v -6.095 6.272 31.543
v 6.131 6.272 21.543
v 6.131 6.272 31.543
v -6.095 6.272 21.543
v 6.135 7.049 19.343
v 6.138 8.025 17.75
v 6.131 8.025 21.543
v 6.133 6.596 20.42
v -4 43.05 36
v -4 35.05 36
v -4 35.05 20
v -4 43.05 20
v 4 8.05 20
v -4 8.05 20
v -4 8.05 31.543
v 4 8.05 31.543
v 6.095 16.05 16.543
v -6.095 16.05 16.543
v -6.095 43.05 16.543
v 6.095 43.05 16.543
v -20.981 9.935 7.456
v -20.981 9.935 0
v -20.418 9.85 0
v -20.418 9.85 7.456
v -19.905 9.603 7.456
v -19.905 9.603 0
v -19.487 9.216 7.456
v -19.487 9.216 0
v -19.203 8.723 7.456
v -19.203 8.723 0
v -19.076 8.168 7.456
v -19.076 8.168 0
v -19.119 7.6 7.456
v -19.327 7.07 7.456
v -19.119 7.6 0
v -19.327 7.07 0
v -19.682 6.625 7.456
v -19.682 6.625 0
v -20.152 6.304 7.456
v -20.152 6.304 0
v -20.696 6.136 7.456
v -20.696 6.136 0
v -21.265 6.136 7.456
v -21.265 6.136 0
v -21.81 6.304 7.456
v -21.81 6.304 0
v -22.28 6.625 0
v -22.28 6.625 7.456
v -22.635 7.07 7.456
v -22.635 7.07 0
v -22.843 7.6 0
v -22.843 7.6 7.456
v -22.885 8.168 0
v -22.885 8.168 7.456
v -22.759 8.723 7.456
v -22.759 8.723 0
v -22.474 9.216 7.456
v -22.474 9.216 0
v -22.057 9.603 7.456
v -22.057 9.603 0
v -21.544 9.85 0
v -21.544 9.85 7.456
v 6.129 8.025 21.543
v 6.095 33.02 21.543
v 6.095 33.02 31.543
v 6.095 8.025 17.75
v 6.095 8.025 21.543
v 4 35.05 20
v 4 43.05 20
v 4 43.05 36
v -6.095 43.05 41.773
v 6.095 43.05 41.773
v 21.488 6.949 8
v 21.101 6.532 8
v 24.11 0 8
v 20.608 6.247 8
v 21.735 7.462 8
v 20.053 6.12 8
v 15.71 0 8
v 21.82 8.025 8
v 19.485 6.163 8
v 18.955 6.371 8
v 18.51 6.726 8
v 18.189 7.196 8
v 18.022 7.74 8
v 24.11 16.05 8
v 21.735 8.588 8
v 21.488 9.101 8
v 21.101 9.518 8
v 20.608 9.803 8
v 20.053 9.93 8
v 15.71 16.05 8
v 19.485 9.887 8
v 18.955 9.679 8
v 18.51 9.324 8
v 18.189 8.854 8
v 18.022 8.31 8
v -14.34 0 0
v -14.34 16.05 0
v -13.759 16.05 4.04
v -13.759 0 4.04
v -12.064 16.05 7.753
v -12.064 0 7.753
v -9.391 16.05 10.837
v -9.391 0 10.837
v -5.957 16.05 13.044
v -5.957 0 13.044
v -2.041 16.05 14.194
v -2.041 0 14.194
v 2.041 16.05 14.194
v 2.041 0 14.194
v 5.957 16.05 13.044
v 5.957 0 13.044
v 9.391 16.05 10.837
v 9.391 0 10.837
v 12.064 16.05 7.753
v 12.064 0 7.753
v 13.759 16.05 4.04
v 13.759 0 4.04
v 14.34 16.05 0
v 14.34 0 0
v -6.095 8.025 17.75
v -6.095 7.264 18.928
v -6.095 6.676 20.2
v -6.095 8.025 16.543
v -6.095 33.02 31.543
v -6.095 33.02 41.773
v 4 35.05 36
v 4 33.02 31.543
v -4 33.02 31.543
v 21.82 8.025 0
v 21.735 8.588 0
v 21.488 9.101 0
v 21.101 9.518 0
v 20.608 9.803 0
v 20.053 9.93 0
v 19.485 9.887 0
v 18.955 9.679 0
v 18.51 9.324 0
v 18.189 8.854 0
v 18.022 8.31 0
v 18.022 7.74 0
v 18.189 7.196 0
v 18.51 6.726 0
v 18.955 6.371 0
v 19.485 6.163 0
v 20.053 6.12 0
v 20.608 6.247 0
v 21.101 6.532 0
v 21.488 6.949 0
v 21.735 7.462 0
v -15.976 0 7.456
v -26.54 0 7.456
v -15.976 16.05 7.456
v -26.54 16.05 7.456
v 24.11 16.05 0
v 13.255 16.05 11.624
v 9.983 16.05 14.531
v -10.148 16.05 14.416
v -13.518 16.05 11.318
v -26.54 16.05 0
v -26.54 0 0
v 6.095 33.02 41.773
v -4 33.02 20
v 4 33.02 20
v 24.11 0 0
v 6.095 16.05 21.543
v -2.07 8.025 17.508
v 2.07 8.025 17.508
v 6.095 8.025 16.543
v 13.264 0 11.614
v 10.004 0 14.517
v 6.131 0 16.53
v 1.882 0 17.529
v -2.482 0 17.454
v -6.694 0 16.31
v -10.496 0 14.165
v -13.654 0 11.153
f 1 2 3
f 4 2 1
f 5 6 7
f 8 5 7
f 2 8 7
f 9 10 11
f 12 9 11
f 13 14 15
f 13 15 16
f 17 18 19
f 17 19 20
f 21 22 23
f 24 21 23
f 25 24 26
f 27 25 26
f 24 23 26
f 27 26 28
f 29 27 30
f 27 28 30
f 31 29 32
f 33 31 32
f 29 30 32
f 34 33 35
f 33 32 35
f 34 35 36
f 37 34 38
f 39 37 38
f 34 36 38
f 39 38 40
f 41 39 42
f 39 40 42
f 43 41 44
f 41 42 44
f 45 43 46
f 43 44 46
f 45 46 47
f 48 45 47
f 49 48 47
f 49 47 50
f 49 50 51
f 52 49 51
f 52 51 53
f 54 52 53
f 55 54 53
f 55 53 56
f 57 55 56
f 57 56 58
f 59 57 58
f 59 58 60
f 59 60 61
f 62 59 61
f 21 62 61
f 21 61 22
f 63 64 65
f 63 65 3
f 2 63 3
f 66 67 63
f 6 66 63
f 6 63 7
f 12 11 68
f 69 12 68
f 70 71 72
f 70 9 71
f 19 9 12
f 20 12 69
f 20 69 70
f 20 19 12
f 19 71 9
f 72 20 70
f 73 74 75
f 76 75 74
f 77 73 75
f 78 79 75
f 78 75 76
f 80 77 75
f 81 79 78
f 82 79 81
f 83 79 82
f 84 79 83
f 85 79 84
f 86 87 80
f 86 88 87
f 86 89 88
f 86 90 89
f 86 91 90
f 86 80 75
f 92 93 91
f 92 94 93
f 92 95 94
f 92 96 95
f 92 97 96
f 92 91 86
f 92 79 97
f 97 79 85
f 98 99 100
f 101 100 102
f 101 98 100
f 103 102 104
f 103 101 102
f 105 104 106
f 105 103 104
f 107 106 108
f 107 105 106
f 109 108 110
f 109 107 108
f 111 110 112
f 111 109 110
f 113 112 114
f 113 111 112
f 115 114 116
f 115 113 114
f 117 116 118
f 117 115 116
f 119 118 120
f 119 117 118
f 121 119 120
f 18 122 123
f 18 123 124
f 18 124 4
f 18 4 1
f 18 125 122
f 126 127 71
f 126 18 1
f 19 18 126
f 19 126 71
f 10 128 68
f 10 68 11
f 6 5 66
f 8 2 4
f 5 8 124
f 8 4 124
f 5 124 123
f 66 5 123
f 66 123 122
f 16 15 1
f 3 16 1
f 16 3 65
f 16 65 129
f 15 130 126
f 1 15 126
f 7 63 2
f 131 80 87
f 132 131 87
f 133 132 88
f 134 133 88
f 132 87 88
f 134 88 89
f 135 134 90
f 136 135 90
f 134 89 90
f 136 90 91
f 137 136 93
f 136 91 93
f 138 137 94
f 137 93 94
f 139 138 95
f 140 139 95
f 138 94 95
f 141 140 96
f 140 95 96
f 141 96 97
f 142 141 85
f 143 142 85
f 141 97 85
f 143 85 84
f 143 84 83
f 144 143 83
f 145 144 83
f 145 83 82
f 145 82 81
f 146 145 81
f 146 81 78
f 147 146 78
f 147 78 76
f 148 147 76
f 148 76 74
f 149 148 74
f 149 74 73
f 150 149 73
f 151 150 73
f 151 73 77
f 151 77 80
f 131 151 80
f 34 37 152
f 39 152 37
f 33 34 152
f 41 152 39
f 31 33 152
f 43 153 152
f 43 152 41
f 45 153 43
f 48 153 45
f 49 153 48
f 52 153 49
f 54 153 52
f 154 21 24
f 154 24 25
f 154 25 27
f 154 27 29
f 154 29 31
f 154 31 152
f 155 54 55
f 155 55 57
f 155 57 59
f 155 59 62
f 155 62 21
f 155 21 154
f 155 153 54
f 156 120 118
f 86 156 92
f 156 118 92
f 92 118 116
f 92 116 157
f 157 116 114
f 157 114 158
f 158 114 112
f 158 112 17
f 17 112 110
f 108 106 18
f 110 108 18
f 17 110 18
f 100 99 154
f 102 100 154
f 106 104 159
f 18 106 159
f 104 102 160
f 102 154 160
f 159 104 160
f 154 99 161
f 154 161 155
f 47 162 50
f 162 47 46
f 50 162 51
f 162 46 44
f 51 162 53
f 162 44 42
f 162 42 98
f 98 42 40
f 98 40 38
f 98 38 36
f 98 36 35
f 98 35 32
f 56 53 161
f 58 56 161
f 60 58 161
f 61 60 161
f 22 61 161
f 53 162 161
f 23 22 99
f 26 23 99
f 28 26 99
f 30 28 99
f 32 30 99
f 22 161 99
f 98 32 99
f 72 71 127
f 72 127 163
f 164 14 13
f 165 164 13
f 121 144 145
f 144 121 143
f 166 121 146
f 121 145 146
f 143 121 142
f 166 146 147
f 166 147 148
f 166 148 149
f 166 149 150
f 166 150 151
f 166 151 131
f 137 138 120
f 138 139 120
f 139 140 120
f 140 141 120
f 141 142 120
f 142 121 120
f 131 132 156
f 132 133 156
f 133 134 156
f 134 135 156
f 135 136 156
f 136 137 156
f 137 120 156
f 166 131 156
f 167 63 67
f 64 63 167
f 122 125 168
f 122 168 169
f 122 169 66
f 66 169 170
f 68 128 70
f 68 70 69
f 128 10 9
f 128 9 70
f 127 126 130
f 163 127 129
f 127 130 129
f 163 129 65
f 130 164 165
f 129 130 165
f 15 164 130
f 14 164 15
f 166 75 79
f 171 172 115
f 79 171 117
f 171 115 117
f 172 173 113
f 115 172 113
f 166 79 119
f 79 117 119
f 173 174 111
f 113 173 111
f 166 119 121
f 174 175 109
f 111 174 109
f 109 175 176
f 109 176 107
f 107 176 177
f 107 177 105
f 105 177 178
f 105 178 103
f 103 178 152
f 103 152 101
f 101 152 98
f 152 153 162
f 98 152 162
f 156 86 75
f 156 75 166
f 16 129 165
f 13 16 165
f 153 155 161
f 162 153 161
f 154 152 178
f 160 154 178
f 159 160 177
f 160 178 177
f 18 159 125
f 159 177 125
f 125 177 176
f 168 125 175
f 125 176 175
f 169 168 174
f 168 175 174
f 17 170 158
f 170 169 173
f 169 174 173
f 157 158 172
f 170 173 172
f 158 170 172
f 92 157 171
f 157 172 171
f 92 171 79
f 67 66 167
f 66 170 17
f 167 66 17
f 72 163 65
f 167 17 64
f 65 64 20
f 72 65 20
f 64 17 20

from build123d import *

# Parameters (mm, degrees)
SKETCH_1_R                = 17.63
SKETCH_1_R_2              = 14.34
EXTRUDE_1_DEPTH           = 16.05
EXTRUDE_1_2_DEPTH         = 9.77
EXTRUDE_1_2_DEPTH_BACK    = 3
SKETCH_2_W                = 16
SKETCH_2_H                = 16.05
SKETCH_3_W                = 3.41
SKETCH_3_H                = 16
CUT_EXTRUDE_1_DEPTH       = 37.411121927
SKETCH_4_R                = 1.91
CUT_EXTRUDE_2_DEPTH       = 39.675463798
EXTRUDE_2_DEPTH           = 4
EXTRUDE_2_DEPTH_BACK      = 2.77
SKETCH_5_W                = 12.19
SKETCH_5_H                = 8.263625949
SKETCH_6_W                = 12.19
SKETCH_6_H                = 6.77
EXTRUDE_3_DEPTH           = 63
SKETCH_8_W                = 12.19
SKETCH_8_H                = 6.77
EXTRUDE_4_DEPTH           = 0.16
EXTRUDE_5_DEPTH           = 3.16
EXTRUDE_5_DEPTH_BACK      = 10
SKETCH_12_W               = 16
SKETCH_12_H               = 16.05
SKETCH_13_W               = 1.21
SKETCH_13_H               = 16
CUT_EXTRUDE_3_DEPTH       = 73.543164889
SKETCH_14_R               = 1.91
CUT_EXTRUDE_4_DEPTH       = 90.07387176
SKETCH_15_R               = 4.05
CUT_EXTRUDE_5_DEPTH       = 24
SKETCH_16_W               = 56.400519221
SKETCH_16_H               = 19.935010357
CUT_EXTRUDE_6_DEPTH       = 73.088971918
SKETCH_17_W               = 12.19
SKETCH_17_H               = 71.423625949
EXTRUDE_7_DEPTH           = 25
SKETCH_18_W               = 26.793372528
SKETCH_18_H               = 63.398625949
CUT_EXTRUDE_7_DEPTH       = 25
SKETCH_19_R               = 4
CUT_EXTRUDE_8_DEPTH       = 24
CUT_EXTRUDE_9_DEPTH       = 29
EXTRUDE_9_DEPTH           = 2
FILLET_1_R                = 10
SKETCH_24_W               = 12.19
SKETCH_24_H               = 5
EXTRUDE_10_DEPTH          = 27
SKETCH_27_W               = 12.19
SKETCH_27_H               = 10.03
EXTRUDE_11_DEPTH          = 20.23
CUT_EXTRUDE_10_DEPTH      = 45.23
CUT_EXTRUDE_10_DEPTH_BACK = 8
SKETCH_21_W               = 8
SKETCH_21_H               = 16
SKETCH_25_W               = 20.230462415
SKETCH_25_H               = 10.025
CUT_EXTRUDE_12_DEPTH      = 20.23
SKETCH_31_W               = 8
SKETCH_31_H               = 2.03
EXTRUDE_13_DEPTH          = 16.23
EXTRUDE_17_DEPTH          = 10


with BuildPart() as part:
    # 草圖1 → Extrude 1 (new body)
    with BuildSketch(Plane(origin=(0, 0, 0), x_dir=(1, 0, 0), z_dir=(0, 1, 0))):
        Circle(SKETCH_1_R)
        Circle(SKETCH_1_R_2, mode=Mode.SUBTRACT)
    extrude(amount=EXTRUDE_1_DEPTH)

    # 草圖2 → Extrude 1 2 (add, two sides: drawn at the far end of the back side and taken through both)
    with BuildSketch(Plane(origin=(17.75, 0, 0), x_dir=(0, 0, -1), z_dir=(1, 0, 0)).offset(-EXTRUDE_1_2_DEPTH_BACK)):
        with Locations((0, 8.025)):
            Rectangle(SKETCH_2_W, SKETCH_2_H)
    extrude(amount=EXTRUDE_1_2_DEPTH + EXTRUDE_1_2_DEPTH_BACK)

    # 草圖3 → 除料-伸長1 (cut, through all)
    with BuildSketch(Plane(origin=(0, 16.05, 0), x_dir=(1, 0, 0), z_dir=(0, 1, 0))):
        with Locations((25.815, 0)):
            Rectangle(SKETCH_3_W, SKETCH_3_H)
    extrude(amount=-CUT_EXTRUDE_1_DEPTH, mode=Mode.SUBTRACT)

    # 草圖4 → 除料-伸長2 (cut, through all)
    with BuildSketch(Plane.XY.offset(8)):
        with Locations((19.910203689, 8.025)):
            Circle(SKETCH_4_R)
    extrude(amount=-CUT_EXTRUDE_2_DEPTH, mode=Mode.SUBTRACT)

    # 草圖5 → 填料-伸長2 (add, two sides: drawn at the far end of the back side and taken through both)
    with BuildSketch(Plane.XY.offset(17.75).offset(-EXTRUDE_2_DEPTH_BACK)):
        with Locations((0, 12.156812974)):
            Rectangle(SKETCH_5_W, SKETCH_5_H)
    extrude(amount=EXTRUDE_2_DEPTH + EXTRUDE_2_DEPTH_BACK)

    # 草圖6 → 填料-伸長3 (add)
    with BuildSketch(Plane(origin=(0, 16.288625949, 0), x_dir=(1, 0, 0), z_dir=(0, 1, 0))):
        with Locations((0, -18.365)):
            Rectangle(SKETCH_6_W, SKETCH_6_H)
    extrude(amount=EXTRUDE_3_DEPTH)

    # 草圖8 → 填料-伸長4 (add)
    with BuildSketch(Plane(origin=(0, 79.288625949, 0), x_dir=(1, 0, 0), z_dir=(0, 1, 0))):
        with Locations((0, -18.365)):
            Rectangle(SKETCH_8_W, SKETCH_8_H)
    extrude(amount=EXTRUDE_4_DEPTH)

    # 草圖12 → 填料-伸長5 (add, two sides: drawn at the far end of the back side and taken through both)
    with BuildSketch(Plane(origin=(-17.75, 0, 0), x_dir=(0, 0, -1), z_dir=(1, 0, 0)).offset(-EXTRUDE_5_DEPTH_BACK)):
        with Locations((0.543544944, 8.025)):
            Rectangle(SKETCH_12_W, SKETCH_12_H)
    extrude(amount=EXTRUDE_5_DEPTH + EXTRUDE_5_DEPTH_BACK)

    # 草圖13 → 除料-伸長3 (cut, through all)
    with BuildSketch(Plane(origin=(0, 16.05, 0), x_dir=(1, 0, 0), z_dir=(0, 1, 0))):
        with Locations((-27.145, 0.543544944)):
            Rectangle(SKETCH_13_W, SKETCH_13_H)
    extrude(amount=-CUT_EXTRUDE_3_DEPTH, mode=Mode.SUBTRACT)

    # 草圖14 → 除料-伸長4 (cut, through all)
    with BuildSketch(Plane(origin=(0, 0, -8.543544944), x_dir=(-1, 0, 0), z_dir=(0, 0, -1))):
        with Locations(Location((20.980783679, 8.025, 0), (0, 0, 90))):
            Circle(SKETCH_14_R)
    extrude(amount=-CUT_EXTRUDE_4_DEPTH, mode=Mode.SUBTRACT)

    # 草圖15 → 除料-伸長5 (cut)
    with BuildSketch(Plane(origin=(0, 79.448625949, 0), x_dir=(1, 0, 0), z_dir=(0, 1, 0))):
        with Locations((0, -14.98)):
            Circle(SKETCH_15_R)
    extrude(amount=-CUT_EXTRUDE_5_DEPTH, mode=Mode.SUBTRACT)

    # 草圖16 → 除料-伸長6 (cut, through all)
    with BuildSketch(Plane(origin=(0, 16.05, 0), x_dir=(1, 0, 0), z_dir=(0, 1, 0))):
        with Locations((-4.090259611, 9.967505179)):
            Rectangle(SKETCH_16_W, SKETCH_16_H)
    extrude(amount=-CUT_EXTRUDE_6_DEPTH, mode=Mode.SUBTRACT)

    # 草圖17 → 填料-伸長7 (add)
    with BuildSketch(Plane.XY.offset(21.75)):
        with Locations((0, 43.736812975)):
            Rectangle(SKETCH_17_W, SKETCH_17_H)
    extrude(amount=EXTRUDE_7_DEPTH)

    # 草圖18 → 除料-伸長7 (cut)
    with BuildSketch(Plane.ZY.offset(6.095)):
        with Locations((28.376686264, 47.749312975)):
            Rectangle(SKETCH_18_W, SKETCH_18_H)
    extrude(amount=-CUT_EXTRUDE_7_DEPTH, mode=Mode.SUBTRACT)

    # 草圖19 → 除料-伸長8 (cut)
    with BuildSketch(Plane(origin=(0, 79.448625949, 0), x_dir=(1, 0, 0), z_dir=(0, 1, 0))):
        with Locations((0, -41.773372528)):
            Circle(SKETCH_19_R)
    extrude(amount=-CUT_EXTRUDE_8_DEPTH, mode=Mode.SUBTRACT)

    # 草圖20 → 除料-伸長9 (cut)
    with BuildSketch(Plane(origin=(6.095, 0, 0), x_dir=(0, 0, -1), z_dir=(1, 0, 0))):
        Polygon((-41.773372528, 16.05), (-41.773372528, 8.025), (-46.75, 8.025), (-46.75, 79.448625949), (-41.773372528, 79.448625949), align=None)
    extrude(amount=-CUT_EXTRUDE_9_DEPTH, mode=Mode.SUBTRACT)

    # 草圖23 → 填料-伸長9 (add)
    with BuildSketch(Plane.XZ.offset(-8.025)):
        Polygon((-6.095, 41.773372528), (-6.095, 17.75), (6.13829314, 17.75), (6.095, 41.773372528), align=None)
    extrude(amount=EXTRUDE_9_DEPTH)

    # 圓角1
    # the kernel refuses this fillet: 10 mm, written as the material it takes off along each edge
    with BuildSketch(Plane(origin=(-21.095, 6.025, 17.75), x_dir=(0, 1, 0), z_dir=(1, 0, 0))) as fillet_1_piece_1:
        with BuildLine():
            CenterArc((10, 6), FILLET_1_R, 180, 36.869897646)
            Line((0, 6), (0, 0))
            Line((0, 0), (2, 0))
        make_face()
    extrude(amount=42.23329314, mode=Mode.SUBTRACT)

    # 草圖24 → 填料-伸長10 (add)
    with BuildSketch(Plane(origin=(0, 16.05, 0), x_dir=(1, 0, 0), z_dir=(0, 1, 0))):
        with Locations((0, -19.042910113)):
            Rectangle(SKETCH_24_W, SKETCH_24_H)
    extrude(amount=EXTRUDE_10_DEPTH)

    # 草圖27 → 填料-伸長11 (add)
    with BuildSketch(Plane.XY.offset(21.542910113)):
        with Locations((0, 38.035)):
            Rectangle(SKETCH_27_W, SKETCH_27_H)
    extrude(amount=EXTRUDE_11_DEPTH)

    # 草圖21 → 除料-伸長10 (cut, two sides: drawn at the far end of the back side and taken through both)
    with BuildSketch(Plane(origin=(0, 16.05, 0), x_dir=(1, 0, 0), z_dir=(0, 1, 0)).offset(-CUT_EXTRUDE_10_DEPTH_BACK)):
        with Locations((0, -28)):
            Rectangle(SKETCH_21_W, SKETCH_21_H)
    extrude(amount=CUT_EXTRUDE_10_DEPTH + CUT_EXTRUDE_10_DEPTH_BACK, mode=Mode.SUBTRACT)

    # 草圖25 → 除料-伸長12 (cut)
    with BuildSketch(Plane.ZY.offset(6.095)):
        with Locations((31.658141321, 11.0375)):
            Rectangle(SKETCH_25_W, SKETCH_25_H)
    extrude(amount=-CUT_EXTRUDE_12_DEPTH, mode=Mode.SUBTRACT)

    # 草圖31 → 填料-伸長13 (add)
    with BuildSketch(Plane(origin=(0, 0, 36), x_dir=(-1, 0, 0), z_dir=(0, 0, -1))):
        with Locations((0, 34.035)):
            Rectangle(SKETCH_31_W, SKETCH_31_H)
    extrude(amount=EXTRUDE_13_DEPTH)

    # 草圖33 → 填料-伸長17 (add)
    with BuildSketch(Plane.XY.offset(21.542910113)):
        Polygon((-6.095, 33.02), (-4, 33.02), (-4, 8.05), (4, 8.05), (4, 33.02), (6.095, 33.02), (6.131457839, 6.271602939), (-6.095, 6.271602939), align=None)
    extrude(amount=EXTRUDE_17_DEPTH)


solid = part.part
